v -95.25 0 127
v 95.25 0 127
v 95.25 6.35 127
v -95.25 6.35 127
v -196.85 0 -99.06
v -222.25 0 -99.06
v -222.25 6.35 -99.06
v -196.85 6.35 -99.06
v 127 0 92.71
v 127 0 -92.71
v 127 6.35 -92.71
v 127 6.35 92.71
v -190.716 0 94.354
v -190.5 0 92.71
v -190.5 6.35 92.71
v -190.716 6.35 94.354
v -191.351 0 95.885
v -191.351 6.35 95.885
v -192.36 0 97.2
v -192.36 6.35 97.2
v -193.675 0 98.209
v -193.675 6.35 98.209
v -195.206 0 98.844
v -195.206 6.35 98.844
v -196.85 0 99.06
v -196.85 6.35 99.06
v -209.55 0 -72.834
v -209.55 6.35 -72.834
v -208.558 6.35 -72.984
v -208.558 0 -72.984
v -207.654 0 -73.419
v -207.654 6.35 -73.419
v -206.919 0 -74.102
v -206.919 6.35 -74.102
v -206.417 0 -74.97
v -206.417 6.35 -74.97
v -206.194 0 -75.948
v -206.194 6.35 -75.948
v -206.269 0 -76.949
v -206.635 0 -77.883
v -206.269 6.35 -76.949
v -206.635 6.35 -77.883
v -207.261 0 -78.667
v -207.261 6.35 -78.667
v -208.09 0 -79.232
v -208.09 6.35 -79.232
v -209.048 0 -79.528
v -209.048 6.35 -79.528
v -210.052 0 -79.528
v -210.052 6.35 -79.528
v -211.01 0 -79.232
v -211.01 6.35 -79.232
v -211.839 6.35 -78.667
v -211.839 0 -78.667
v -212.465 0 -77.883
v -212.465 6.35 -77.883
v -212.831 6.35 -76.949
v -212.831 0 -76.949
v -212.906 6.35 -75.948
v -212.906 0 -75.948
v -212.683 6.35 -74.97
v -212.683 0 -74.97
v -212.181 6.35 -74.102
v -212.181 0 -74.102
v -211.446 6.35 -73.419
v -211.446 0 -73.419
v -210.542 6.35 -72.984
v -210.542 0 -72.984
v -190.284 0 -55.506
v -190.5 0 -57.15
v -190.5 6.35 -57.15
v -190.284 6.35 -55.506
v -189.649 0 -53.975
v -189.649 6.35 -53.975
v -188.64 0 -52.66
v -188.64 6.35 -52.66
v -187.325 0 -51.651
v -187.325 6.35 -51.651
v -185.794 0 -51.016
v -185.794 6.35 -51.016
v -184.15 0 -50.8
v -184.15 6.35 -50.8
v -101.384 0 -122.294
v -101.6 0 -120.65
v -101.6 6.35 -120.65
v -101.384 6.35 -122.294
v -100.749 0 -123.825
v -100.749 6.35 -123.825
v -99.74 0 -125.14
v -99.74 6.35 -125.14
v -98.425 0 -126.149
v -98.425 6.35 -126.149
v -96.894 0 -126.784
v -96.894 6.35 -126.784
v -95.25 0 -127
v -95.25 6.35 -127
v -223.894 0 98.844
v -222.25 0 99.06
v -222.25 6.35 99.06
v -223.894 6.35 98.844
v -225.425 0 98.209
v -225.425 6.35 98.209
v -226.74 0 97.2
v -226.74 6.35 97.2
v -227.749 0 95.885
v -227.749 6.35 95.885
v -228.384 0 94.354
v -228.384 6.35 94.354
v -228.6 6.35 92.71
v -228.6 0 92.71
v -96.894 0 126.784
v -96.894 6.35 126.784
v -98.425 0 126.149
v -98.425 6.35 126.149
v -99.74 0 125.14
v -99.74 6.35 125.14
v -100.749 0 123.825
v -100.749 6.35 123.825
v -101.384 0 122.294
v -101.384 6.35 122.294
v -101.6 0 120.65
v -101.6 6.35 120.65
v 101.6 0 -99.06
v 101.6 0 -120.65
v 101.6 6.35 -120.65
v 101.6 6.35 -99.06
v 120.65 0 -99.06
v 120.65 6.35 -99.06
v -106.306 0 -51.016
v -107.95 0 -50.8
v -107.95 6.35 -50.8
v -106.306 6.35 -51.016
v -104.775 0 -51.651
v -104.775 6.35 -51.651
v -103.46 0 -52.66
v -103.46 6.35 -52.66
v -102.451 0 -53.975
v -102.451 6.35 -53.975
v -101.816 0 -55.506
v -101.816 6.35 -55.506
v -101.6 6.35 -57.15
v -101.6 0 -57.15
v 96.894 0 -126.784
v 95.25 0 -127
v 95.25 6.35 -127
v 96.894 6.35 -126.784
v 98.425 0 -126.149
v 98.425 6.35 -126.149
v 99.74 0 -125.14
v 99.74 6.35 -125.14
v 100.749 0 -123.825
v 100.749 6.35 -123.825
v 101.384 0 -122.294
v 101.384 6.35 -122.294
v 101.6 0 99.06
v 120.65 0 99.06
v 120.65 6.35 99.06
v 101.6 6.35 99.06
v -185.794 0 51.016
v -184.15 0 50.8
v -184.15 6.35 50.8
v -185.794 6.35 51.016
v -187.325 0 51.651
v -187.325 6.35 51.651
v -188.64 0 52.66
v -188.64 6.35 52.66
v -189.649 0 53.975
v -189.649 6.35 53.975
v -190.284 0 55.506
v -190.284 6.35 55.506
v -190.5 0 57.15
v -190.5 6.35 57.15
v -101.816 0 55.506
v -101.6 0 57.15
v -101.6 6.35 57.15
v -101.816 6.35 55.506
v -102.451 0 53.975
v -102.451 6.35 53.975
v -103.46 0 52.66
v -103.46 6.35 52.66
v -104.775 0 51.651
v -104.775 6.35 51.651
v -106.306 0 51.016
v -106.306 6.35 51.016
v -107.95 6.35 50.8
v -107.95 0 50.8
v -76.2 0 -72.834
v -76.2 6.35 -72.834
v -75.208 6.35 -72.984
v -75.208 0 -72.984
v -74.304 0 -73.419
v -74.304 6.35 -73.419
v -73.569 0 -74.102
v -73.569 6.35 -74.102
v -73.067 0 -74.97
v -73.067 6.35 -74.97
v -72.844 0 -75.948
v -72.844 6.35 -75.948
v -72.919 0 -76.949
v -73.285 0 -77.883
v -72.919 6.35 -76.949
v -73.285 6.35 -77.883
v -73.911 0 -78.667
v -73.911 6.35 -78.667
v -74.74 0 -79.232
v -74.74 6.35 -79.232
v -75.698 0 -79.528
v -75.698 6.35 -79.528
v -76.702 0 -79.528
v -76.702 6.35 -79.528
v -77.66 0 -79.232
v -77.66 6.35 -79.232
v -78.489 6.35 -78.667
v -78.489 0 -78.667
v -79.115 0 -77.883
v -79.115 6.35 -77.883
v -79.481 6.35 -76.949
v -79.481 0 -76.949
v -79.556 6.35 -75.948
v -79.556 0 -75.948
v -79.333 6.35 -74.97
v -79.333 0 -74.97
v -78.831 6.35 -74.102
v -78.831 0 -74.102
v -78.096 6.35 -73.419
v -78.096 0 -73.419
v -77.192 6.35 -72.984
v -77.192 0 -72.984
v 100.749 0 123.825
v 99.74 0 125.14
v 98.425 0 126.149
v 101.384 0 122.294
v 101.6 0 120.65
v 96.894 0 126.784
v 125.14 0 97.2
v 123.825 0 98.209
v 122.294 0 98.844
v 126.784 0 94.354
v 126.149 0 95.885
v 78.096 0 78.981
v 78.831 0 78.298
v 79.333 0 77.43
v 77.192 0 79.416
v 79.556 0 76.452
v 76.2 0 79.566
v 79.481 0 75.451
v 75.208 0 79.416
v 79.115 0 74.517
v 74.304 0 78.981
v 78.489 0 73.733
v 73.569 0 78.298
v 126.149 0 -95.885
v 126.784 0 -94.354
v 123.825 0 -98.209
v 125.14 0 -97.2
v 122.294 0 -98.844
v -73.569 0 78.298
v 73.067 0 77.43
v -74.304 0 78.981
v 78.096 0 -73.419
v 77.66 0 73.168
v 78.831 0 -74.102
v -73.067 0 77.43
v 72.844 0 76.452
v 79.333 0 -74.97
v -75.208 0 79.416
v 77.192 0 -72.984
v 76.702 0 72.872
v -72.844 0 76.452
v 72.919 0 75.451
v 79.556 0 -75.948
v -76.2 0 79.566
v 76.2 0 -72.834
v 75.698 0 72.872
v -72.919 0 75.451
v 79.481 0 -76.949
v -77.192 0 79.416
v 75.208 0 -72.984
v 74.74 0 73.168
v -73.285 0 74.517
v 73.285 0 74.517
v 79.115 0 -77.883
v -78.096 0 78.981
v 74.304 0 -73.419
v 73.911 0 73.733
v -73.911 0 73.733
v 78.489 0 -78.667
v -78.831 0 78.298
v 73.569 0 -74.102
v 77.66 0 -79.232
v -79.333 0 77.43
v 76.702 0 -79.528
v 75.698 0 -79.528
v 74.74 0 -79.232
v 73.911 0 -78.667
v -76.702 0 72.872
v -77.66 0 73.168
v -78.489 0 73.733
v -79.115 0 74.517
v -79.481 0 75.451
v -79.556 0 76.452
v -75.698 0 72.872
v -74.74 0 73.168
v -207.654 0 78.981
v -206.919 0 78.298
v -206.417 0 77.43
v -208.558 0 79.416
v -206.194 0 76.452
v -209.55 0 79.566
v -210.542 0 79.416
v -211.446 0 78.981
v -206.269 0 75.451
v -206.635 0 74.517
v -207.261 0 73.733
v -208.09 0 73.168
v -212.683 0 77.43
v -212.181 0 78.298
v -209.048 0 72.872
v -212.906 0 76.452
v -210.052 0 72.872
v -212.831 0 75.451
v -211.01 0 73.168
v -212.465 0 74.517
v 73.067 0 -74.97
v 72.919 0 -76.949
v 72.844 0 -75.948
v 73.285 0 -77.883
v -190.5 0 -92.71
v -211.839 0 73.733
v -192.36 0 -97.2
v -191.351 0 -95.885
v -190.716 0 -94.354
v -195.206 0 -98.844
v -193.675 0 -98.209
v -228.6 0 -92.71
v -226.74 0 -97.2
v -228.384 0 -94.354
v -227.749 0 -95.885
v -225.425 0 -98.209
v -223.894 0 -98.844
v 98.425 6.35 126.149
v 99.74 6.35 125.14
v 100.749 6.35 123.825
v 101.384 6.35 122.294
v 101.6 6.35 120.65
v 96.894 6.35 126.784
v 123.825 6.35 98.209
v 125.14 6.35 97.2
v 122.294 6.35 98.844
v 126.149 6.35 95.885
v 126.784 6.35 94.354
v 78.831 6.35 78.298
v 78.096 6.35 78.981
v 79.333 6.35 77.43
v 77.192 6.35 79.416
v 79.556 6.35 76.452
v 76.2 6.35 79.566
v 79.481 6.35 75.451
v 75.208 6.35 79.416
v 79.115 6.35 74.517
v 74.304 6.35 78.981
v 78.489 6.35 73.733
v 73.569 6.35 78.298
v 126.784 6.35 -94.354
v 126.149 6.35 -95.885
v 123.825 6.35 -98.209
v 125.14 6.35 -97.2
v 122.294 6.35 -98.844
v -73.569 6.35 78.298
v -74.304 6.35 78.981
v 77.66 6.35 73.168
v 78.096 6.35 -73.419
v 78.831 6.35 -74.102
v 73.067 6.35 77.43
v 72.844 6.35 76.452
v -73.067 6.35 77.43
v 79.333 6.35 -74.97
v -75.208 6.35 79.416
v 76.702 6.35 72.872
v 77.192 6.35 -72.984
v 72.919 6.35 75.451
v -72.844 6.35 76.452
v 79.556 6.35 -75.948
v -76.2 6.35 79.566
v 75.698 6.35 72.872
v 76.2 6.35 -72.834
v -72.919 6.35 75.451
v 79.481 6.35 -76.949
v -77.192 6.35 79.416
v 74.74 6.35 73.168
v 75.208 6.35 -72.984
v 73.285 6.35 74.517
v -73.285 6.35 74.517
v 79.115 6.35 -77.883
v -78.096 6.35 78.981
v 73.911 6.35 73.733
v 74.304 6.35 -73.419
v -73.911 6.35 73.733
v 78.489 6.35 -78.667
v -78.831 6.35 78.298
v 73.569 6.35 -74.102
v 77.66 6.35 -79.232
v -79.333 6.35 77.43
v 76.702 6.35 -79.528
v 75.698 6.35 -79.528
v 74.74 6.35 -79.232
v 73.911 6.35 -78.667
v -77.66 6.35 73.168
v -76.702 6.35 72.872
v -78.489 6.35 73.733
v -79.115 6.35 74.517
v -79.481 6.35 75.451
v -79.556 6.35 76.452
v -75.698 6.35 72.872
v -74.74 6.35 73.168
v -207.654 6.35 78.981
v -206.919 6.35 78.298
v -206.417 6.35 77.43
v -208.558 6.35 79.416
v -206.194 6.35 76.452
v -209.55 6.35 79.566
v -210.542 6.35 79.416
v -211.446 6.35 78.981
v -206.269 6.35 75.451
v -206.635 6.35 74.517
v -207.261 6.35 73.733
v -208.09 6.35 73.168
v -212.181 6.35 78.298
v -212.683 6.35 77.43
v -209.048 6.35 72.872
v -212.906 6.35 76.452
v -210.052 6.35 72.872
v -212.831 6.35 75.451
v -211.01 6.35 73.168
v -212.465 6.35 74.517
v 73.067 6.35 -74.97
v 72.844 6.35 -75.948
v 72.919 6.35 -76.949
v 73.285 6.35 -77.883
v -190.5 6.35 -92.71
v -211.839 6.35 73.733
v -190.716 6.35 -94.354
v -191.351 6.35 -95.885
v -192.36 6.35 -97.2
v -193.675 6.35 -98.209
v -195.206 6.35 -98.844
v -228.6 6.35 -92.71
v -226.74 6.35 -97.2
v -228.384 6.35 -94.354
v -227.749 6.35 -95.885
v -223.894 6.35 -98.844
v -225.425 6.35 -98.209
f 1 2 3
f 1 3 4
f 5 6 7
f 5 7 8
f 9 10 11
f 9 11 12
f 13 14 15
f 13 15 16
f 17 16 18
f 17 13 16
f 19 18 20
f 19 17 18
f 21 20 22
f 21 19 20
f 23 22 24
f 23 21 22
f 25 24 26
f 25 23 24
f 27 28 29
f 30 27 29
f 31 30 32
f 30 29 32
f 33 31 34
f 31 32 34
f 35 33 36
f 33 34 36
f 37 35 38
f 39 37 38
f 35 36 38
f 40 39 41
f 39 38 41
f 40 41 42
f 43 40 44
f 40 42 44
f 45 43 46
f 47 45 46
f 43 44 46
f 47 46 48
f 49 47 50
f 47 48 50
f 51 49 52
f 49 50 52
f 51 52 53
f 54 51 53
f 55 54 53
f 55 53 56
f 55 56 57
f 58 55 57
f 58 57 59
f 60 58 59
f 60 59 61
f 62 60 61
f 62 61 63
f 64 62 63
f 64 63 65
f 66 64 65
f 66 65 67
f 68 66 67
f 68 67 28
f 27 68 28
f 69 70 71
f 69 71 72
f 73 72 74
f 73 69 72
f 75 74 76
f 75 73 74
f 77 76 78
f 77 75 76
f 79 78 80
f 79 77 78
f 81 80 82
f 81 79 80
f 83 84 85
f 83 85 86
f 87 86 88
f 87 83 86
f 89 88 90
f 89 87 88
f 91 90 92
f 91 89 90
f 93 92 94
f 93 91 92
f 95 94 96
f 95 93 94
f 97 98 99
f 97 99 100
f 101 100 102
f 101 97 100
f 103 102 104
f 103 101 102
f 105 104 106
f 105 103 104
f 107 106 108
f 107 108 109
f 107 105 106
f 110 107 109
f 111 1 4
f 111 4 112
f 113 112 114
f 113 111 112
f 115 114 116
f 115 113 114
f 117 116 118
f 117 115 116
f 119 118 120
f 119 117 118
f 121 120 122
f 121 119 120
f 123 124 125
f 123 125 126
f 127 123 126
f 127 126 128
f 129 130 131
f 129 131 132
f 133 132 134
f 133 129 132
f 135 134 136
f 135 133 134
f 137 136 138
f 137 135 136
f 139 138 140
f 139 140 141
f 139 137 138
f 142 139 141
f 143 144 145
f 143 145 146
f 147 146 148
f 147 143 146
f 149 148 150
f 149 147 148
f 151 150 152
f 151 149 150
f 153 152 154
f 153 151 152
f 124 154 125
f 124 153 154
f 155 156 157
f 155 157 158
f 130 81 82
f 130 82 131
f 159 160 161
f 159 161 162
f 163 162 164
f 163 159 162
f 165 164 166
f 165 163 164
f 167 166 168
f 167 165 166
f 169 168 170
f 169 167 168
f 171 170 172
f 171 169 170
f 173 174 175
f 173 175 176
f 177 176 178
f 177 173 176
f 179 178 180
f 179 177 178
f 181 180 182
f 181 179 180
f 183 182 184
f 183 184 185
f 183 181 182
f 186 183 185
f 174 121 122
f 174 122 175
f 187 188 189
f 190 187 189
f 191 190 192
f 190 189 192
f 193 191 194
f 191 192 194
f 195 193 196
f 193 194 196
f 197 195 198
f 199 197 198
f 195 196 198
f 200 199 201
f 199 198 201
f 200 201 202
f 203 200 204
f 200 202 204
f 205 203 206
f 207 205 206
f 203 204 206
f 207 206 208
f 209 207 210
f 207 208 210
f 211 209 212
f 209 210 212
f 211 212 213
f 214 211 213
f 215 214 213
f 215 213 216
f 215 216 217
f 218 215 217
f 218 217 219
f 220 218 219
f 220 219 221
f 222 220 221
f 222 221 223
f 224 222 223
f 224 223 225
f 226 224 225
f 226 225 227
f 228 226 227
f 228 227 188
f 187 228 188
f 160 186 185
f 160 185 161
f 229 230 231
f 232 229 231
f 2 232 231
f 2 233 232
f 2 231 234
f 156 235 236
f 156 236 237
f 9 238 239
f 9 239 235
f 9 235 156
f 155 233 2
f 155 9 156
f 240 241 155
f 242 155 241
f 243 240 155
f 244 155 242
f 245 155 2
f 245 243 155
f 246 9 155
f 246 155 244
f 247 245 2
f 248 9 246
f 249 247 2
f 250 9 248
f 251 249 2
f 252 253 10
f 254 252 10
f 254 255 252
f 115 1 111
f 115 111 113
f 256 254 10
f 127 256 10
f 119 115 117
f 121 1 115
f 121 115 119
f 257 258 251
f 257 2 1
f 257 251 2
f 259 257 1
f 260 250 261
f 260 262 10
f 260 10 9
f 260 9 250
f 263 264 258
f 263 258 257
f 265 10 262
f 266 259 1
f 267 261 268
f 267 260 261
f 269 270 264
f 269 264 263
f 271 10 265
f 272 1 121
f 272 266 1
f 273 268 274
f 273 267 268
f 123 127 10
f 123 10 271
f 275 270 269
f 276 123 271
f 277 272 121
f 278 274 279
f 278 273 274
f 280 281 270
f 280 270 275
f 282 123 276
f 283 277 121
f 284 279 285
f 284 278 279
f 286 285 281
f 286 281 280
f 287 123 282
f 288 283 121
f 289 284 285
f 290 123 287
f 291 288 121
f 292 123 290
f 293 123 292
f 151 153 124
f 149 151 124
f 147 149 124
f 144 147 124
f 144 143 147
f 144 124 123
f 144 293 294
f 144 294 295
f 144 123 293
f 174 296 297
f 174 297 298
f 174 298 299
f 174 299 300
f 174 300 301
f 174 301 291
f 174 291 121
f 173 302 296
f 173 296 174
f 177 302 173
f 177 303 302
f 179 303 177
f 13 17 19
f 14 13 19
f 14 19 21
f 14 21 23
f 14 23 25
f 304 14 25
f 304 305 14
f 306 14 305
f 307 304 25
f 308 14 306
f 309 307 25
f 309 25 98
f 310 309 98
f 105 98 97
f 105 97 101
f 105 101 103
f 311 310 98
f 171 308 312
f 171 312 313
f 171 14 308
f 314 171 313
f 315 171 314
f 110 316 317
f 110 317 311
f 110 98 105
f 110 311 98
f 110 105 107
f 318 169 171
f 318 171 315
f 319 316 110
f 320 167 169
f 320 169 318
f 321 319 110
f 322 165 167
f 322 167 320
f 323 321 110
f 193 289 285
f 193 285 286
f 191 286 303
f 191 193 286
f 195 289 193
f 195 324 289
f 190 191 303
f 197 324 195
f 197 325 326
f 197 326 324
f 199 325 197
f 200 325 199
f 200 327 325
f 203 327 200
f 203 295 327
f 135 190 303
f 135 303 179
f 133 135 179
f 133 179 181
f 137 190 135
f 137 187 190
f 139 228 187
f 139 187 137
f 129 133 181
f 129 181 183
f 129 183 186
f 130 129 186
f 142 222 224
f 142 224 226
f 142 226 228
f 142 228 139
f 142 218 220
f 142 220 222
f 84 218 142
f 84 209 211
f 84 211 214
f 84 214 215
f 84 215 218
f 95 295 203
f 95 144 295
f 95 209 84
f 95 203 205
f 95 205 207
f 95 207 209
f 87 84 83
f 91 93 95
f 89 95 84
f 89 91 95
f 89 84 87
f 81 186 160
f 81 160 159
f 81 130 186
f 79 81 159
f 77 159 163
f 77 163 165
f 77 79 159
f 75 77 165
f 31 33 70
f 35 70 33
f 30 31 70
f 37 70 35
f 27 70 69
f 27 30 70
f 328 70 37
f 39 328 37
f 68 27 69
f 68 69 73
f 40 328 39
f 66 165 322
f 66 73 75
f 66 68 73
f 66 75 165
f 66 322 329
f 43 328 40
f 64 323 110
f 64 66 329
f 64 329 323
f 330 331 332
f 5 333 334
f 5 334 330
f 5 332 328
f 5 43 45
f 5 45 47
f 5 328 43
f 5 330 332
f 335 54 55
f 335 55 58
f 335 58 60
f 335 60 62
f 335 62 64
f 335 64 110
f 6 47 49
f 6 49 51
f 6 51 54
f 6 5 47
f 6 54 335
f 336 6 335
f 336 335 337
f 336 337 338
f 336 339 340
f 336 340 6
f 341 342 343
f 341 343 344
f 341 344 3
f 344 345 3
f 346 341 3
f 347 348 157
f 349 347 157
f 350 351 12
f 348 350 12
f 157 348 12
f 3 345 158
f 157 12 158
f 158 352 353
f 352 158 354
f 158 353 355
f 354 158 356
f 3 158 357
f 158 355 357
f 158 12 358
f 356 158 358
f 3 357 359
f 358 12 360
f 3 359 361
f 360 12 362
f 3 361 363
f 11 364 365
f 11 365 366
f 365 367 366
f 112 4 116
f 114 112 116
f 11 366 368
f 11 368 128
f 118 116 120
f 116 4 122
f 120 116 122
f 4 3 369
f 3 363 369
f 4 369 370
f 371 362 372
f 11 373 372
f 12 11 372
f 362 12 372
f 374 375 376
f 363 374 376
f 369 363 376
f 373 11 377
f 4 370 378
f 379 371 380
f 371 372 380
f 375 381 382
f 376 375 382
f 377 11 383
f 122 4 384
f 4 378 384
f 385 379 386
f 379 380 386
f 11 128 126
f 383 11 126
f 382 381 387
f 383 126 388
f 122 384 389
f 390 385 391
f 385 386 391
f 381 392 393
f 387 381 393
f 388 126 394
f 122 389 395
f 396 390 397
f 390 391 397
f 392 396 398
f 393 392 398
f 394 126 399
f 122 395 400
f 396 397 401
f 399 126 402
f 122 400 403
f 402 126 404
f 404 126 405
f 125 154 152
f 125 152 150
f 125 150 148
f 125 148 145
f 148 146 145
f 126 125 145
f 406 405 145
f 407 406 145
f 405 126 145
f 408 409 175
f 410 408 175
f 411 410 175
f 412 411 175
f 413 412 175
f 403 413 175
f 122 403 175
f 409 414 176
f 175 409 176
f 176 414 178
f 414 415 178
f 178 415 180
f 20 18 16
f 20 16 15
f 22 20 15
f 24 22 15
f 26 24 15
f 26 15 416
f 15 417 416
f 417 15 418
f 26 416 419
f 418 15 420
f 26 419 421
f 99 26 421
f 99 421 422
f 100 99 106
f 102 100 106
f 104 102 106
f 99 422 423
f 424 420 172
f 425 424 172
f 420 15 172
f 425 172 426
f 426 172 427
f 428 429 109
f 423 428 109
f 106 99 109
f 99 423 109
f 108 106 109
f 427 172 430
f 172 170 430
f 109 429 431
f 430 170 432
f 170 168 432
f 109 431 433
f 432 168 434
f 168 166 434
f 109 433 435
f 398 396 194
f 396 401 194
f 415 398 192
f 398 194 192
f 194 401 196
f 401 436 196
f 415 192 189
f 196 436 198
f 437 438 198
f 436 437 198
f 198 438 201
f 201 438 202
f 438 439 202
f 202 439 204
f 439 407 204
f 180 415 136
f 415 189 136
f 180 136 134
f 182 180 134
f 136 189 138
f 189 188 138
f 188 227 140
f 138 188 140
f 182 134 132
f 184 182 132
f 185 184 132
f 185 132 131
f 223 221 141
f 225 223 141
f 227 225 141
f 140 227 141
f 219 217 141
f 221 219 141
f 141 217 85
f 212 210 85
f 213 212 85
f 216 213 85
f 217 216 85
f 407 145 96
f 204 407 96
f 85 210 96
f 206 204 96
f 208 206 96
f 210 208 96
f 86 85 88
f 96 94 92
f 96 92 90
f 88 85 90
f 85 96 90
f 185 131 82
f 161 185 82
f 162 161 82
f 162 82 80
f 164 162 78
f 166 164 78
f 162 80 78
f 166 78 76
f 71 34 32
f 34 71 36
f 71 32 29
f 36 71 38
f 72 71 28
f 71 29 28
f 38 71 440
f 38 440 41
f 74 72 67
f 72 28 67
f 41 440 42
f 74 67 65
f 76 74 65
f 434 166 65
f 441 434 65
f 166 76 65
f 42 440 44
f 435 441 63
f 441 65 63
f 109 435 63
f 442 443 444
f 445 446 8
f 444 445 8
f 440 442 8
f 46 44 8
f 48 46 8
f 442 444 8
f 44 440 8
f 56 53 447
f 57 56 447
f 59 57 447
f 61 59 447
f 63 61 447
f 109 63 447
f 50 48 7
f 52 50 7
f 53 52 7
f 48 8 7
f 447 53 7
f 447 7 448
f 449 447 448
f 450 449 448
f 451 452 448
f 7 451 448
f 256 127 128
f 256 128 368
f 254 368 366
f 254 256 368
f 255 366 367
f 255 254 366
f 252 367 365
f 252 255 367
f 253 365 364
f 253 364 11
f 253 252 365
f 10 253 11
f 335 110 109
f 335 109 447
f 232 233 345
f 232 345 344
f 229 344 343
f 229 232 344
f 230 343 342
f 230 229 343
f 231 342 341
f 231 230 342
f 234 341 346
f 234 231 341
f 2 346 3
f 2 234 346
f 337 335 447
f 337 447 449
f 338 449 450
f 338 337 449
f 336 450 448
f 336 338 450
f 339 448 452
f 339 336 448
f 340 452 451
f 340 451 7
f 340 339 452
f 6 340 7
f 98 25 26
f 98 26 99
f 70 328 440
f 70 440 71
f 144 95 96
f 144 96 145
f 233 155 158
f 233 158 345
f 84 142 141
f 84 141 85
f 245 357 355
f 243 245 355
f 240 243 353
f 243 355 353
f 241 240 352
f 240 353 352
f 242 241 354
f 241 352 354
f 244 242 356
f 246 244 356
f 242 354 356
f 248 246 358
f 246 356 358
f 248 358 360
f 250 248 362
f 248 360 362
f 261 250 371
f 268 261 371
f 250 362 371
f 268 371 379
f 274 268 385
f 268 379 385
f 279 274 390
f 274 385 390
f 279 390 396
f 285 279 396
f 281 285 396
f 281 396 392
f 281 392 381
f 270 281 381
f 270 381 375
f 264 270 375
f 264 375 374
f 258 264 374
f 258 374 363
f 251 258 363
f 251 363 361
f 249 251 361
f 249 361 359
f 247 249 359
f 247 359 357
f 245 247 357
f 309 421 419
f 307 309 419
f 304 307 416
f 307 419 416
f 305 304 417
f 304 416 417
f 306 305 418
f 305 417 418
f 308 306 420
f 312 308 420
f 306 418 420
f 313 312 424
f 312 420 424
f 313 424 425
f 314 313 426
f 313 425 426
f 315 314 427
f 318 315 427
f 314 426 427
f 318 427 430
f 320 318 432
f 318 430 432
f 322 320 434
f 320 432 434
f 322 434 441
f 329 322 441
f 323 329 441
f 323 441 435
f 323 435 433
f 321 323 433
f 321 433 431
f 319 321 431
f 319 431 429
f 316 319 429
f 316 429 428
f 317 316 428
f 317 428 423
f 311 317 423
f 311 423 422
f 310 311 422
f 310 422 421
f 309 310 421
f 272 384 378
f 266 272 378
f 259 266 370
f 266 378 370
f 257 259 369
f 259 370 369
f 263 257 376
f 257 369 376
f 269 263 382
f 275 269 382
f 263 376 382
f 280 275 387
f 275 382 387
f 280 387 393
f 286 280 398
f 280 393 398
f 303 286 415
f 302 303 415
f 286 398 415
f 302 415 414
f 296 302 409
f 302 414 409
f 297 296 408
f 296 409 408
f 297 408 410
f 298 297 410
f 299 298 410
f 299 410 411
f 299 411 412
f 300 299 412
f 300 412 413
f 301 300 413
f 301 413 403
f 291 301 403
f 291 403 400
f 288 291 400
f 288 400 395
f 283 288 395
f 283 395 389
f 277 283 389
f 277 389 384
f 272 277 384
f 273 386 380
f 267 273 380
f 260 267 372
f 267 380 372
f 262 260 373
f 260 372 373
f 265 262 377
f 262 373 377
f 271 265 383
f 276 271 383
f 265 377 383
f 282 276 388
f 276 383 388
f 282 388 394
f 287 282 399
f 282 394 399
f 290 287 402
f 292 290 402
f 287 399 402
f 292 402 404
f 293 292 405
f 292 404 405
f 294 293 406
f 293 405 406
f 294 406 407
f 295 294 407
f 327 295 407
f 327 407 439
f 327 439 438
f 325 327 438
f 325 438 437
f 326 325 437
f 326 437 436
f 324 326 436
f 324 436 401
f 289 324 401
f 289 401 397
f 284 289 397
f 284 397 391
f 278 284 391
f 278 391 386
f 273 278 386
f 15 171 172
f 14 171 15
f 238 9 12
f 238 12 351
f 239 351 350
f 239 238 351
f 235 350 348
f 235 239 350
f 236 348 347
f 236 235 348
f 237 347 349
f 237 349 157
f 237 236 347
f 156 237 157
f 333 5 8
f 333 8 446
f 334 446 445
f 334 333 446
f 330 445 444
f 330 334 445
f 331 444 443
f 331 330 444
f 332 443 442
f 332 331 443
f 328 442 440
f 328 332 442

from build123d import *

# Parameters (mm, degrees)
BOSS_EXTRUDE1_DEPTH = 6.35
SKETCH2_R           = 3.3655
CUT_EXTRUDE1_DEPTH  = 262.586090036


with BuildPart() as part:
    # Sketch1 → Boss-Extrude1 (new body)
    with BuildSketch(Plane(origin=(0, 0, 0), x_dir=(1, 0, 0), z_dir=(0, 1, 0))):
        with BuildLine():
            Line((-222.25, 99.06), (-196.85, 99.06))
            ThreePointArc((-196.85, 99.06), (-192.359871939, 97.200128061), (-190.5, 92.71))
            Line((-190.5, 92.71), (-190.5, 57.15))
            ThreePointArc((-190.5, 57.15), (-188.640128061, 52.659871939), (-184.15, 50.8))
            Line((-184.15, 50.8), (-107.95, 50.8))
            ThreePointArc((-107.95, 50.8), (-103.459871939, 52.659871939), (-101.6, 57.15))
            Line((-101.6, 57.15), (-101.6, 120.65))
            ThreePointArc((-101.6, 120.65), (-99.740128061, 125.140128061), (-95.25, 127))
            Line((-95.25, 127), (95.25, 127))
            ThreePointArc((95.25, 127), (99.740128061, 125.140128061), (101.6, 120.65))
            Line((101.6, 120.65), (101.6, 99.06))
            Line((101.6, 99.06), (120.65, 99.06))
            ThreePointArc((120.65, 99.06), (125.14012806, 97.200128061), (127, 92.71))
            Line((127, 92.71), (127, -92.71))
            ThreePointArc((127, -92.71), (125.14012806, -97.200128061), (120.65, -99.06))
            Line((120.65, -99.06), (101.6, -99.06))
            Line((101.6, -99.06), (101.6, -120.65))
            ThreePointArc((101.6, -120.65), (99.740128061, -125.140128061), (95.25, -127))
            Line((95.25, -127), (-95.25, -127))
            ThreePointArc((-95.25, -127), (-99.740128061, -125.140128061), (-101.6, -120.65))
            Line((-101.6, -120.65), (-101.6, -57.15))
            ThreePointArc((-101.6, -57.15), (-103.459871939, -52.659871939), (-107.95, -50.8))
            Line((-107.95, -50.8), (-184.15, -50.8))
            ThreePointArc((-184.15, -50.8), (-188.640128061, -52.659871939), (-190.5, -57.15))
            Line((-190.5, -57.15), (-190.5, -92.71))
            ThreePointArc((-190.5, -92.71), (-192.359871939, -97.200128061), (-196.85, -99.06))
            Line((-196.85, -99.06), (-222.25, -99.06))
            ThreePointArc((-222.25, -99.06), (-226.740128061, -97.200128061), (-228.6, -92.71))
            Line((-228.6, -92.71), (-228.6, 92.71))
            ThreePointArc((-228.6, 92.71), (-226.740128061, 97.200128061), (-222.25, 99.06))
        make_face()
    extrude(amount=BOSS_EXTRUDE1_DEPTH)

    # Sketch2 → Cut-Extrude1 (cut, through all)
    with BuildSketch(Plane(origin=(0, 6.35, 0), x_dir=(1, 0, 0), z_dir=(0, 1, 0))):
        with Locations(Location((-76.2, 76.2, 0), (0, 0, 270))):
            Circle(SKETCH2_R)
        with Locations(Location((76.2, 76.2, 0), (0, 0, 270))):
            Circle(SKETCH2_R)
        with Locations(Location((-76.2, -76.2, 0), (0, 0, 270))):
            Circle(SKETCH2_R)
        with Locations(Location((76.2, -76.2, 0), (0, 0, 270))):
            Circle(SKETCH2_R)
        with Locations(Location((-209.55, 76.2, 0), (0, 0, 270))):
            Circle(SKETCH2_R)
        with Locations(Location((-209.55, -76.2, 0), (0, 0, 270))):
            Circle(SKETCH2_R)
    extrude(amount=-CUT_EXTRUDE1_DEPTH, mode=Mode.SUBTRACT)


solid = part.part
